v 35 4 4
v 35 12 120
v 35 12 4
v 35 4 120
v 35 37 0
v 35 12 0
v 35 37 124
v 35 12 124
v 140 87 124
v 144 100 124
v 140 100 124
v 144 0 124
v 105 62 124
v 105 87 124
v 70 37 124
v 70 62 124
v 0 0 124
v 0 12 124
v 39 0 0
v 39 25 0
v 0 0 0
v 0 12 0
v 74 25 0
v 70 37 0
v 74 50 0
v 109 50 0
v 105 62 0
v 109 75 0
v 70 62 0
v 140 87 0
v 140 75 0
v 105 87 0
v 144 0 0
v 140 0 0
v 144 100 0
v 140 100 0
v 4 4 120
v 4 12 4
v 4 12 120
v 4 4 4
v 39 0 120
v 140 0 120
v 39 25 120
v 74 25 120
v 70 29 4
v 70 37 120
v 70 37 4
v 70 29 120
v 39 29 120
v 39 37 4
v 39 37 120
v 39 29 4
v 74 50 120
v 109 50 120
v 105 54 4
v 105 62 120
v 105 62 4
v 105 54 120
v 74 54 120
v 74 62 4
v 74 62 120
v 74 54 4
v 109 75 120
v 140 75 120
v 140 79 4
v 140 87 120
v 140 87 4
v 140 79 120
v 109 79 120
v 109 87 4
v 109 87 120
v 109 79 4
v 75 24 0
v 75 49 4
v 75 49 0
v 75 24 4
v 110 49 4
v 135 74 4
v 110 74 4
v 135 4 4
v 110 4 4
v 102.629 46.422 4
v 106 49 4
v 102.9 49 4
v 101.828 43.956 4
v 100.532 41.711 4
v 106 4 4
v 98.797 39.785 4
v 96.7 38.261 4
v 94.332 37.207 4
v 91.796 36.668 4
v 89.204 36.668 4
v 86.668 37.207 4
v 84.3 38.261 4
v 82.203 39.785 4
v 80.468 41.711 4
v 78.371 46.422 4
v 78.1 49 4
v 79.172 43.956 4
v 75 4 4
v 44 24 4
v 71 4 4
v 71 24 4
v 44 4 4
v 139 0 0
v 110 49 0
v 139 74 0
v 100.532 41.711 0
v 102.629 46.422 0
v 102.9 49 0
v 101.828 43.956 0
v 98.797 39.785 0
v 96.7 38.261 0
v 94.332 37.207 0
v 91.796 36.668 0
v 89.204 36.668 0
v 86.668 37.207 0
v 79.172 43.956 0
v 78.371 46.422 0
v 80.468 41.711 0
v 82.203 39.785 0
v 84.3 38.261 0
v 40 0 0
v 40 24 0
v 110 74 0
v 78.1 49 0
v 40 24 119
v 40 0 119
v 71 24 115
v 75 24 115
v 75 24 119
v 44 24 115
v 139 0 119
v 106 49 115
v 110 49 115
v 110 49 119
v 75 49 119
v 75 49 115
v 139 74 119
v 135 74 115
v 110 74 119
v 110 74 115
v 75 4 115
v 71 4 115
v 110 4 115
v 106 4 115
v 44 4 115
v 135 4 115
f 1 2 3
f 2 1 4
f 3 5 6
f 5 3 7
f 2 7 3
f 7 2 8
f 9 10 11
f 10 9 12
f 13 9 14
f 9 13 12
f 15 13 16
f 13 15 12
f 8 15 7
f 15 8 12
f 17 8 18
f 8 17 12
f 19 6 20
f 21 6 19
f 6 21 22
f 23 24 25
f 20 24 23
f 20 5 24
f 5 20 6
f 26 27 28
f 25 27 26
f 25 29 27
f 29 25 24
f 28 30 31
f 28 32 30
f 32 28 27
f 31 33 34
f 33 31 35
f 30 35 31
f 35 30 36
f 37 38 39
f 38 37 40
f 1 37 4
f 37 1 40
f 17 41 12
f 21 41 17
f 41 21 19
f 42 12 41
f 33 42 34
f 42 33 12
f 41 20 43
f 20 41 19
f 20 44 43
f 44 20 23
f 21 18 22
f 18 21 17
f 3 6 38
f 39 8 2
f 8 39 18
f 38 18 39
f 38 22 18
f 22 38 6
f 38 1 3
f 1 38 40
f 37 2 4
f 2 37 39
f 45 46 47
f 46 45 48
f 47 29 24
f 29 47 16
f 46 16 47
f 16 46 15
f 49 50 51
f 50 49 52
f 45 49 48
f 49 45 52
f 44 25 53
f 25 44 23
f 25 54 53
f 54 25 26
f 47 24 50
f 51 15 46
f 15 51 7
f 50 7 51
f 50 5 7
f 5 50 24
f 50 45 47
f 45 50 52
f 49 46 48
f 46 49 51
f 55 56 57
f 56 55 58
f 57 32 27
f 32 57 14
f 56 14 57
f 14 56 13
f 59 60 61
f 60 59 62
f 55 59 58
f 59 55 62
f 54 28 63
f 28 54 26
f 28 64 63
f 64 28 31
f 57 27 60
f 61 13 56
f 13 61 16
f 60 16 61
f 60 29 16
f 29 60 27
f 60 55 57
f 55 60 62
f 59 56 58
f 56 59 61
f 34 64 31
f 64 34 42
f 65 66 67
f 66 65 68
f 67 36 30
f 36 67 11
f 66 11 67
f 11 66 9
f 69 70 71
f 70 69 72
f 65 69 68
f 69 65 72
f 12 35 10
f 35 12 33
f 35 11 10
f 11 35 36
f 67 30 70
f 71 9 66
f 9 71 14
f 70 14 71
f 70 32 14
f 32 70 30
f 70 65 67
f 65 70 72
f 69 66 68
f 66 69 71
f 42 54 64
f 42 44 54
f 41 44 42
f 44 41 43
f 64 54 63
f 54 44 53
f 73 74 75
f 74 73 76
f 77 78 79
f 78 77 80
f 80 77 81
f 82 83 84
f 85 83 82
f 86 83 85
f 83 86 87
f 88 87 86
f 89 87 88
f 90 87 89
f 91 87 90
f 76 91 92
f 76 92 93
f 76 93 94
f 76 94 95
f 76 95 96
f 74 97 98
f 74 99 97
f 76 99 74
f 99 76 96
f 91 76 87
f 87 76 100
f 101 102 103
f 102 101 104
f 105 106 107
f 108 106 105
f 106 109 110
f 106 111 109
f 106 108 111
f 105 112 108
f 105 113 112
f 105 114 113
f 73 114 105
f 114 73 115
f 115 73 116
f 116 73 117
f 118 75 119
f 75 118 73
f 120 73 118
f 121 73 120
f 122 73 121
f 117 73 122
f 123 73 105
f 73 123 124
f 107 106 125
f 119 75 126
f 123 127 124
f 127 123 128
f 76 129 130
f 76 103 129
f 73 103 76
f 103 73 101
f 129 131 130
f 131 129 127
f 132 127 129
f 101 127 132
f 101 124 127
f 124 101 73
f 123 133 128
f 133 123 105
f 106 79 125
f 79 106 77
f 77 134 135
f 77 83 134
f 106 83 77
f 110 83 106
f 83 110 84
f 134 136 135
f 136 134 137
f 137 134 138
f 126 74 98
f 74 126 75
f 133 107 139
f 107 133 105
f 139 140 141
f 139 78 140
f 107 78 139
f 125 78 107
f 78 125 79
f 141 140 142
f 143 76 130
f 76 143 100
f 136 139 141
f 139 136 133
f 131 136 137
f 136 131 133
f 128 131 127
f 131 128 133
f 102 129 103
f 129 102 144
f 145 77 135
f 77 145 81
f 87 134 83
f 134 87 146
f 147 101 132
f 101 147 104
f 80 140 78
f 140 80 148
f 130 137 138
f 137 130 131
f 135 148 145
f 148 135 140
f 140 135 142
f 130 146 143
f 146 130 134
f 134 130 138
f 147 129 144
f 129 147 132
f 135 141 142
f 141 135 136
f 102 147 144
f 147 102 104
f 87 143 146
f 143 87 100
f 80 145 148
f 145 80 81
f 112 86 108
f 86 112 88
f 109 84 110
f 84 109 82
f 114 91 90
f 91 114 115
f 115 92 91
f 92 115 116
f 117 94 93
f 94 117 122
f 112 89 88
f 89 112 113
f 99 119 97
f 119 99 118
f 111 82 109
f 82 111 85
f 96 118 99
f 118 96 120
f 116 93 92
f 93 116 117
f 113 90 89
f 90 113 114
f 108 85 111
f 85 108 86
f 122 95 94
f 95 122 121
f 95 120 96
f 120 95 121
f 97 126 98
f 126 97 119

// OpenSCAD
// file: fillets3d.scad
/*
Created by Kevin Gravier
https://www.thingiverse.com/mrkmg/about

My take on a top and bottom fillet for a 3d shape.

Available Modules:

topBottomFillet(b, t, r, s, e)
b = z of bottom of 3d object
t = z of top of 3d object
r = radius of fillet
s = steps of filler (smaller is smoother)
e = enabled (pass e = 0 to disable fillet for faster preview)

topFillet(t, r, s, e)
t = z of top of 3d object
r = radius of fillet
s = steps of filler (smaller is smoother)
e = enabled (pass e = 0 to disable fillet for faster preview)

bottomFillet(b, r, s, e)
b = z of bottom of 3d object
r = radius of fillet
s = steps of filler (smaller is smoother)
e = enabled (pass e = 0 to disable fillet for faster preview)

*/

enable = 1;

// Example, hard edges
translate([0, 20, 0])
topBottomFillet(b = 0, t = 10, r = 2, s = 20, e = enable)
linear_extrude(10, scale = 1.2)
difference() {
    union() {
        square([10, 10], true);
        translate([-15, 0]) circle(15);
    }
    translate([-15, 0]) circle(8);
    translate([-15, 0]) square([13, 13], center = true);
}

// Example, soft edges
use <fillets2d.scad>;
translate([0, -20, 0])
topBottomFillet(b = 0, t = 10, r = 1, s = 10, e = enable)
linear_extrude(10)
rounding2d(1)
fillet2d(1)
difference() {
    union() {
        square([10, 10], true);
        translate([-15, 0]) circle(15);
    }
    translate([-15, 0]) circle(8);
    translate([-15, 0]) square([13, 13], center = true);
}


// Example, text
translate([-60, 40])
rotate([0, 0, -90])
topBottomFillet(b = 0, t = 3, r = .5, s = 5, e = enable)
linear_extrude(3)
text("Fillets!", size = 20);


// Library

function filletDepth(r, d, i) = r * cos(asin(d * i / r));

module topBottomFillet(b = 0, t = 2, r = 1, s = 4, e = 1) {
    if (e == 1) {        
        topFilletPeice(t = t, r = r, s = s) children(0);
        bottomFilletPeice(b = b, r = r, s = s) children(0);
        
        render()
        difference() {
            children(0);
            
            translate([0, 0, t - r])
            linear_extrude(r + 1)
            offset(delta = 1e5)
            projection()
            children(0);
            
            translate([0, 0, b - 1])
            linear_extrude(r + 1)
            offset(delta = 1e5)
            projection()
            children(0);
            
        }
    }
    if (e == 0) children(0);
}

module topFillet(t = 2, r = 1, s = 4, e = 1) {
    if (e == 1) {
        topFilletPeice(t = t, r = r, s = s) children(0);
        
        render()
        difference() {
            children(0);
            translate([0, 0, t-r])
            linear_extrude(r + 1)
            offset(delta = 1e5)
            projection()
            children(0);
        }
    }
    if (e == 0) children(0);
}

module bottomFillet(b = 0, r = 1, s = 4, e = 1) {
    if (e == 1) {
        bottomFilletPeice(b = b, r = r, s = s) children(0);
        
        render()
        difference() {
            children(0);
            translate([0, 0, b - r - 1])
            linear_extrude(r + 1)
            offset(delta = 1e5)
            projection()
            children(0);
        }
    }
    if (e == 0) children(0);
}

module topFilletPeice(t = 2, r = 1, s = 4) {
    d = r/s;
        
    for (i = [0:s]) {
        x = filletDepth(r, d, i);
        z = d * (s - i + 1);                  
        translate([0, 0, t - z]) 
        linear_extrude(d) 
        offset(delta = -r + x) 
        projection(true) 
        translate([0, 0, -t + z])
        children(0);
    }
}

module bottomFilletPeice(b = 0, r =1, s = 4) {
    d = r/s;
        
    for (i = [0:s]) {
        x = filletDepth(r, d, i);
        z = d * (s - i);
        translate([0, 0, b + z]) 
        linear_extrude(d) 
        offset(delta = -r + x) 
        projection(true)
        translate([0, 0, b - z])
        children(0);
    }
}
// file: fillets2d.scad
/*
Modified by Kevin Gravier
https://www.thingiverse.com/mrkmg/about

Originally from: https://github.com/OskarLinde/scad-utils/blob/master/morphology.scad



Modules:

rounding2d(r)
r = radius of rounding

fillet2d(r)
r = radius of rounding

*/

$fa = 0.1;
$fs = 0.1;

// Example
linear_extrude(1)
rounding2d(1)
fillet2d(1)
difference() {
    union() {
        square([10, 10], center = true);
        translate([5, 5])
        square([10, 10], center = true);
    }
    
    translate([-5, -5])
    square([10, 10], center = true);
    
    translate([8, 8])
    circle(3);
}

// Example, text
translate([-20, -15])
rotate([0, 0, 0])
linear_extrude(1)
rounding2d(.25)
fillet2d(.25)
text("Fillets!");

module fillet2d(r) {
    offset(r = -r) offset(delta = r) children(0);
}

module rounding2d(r) {
    offset(r = r) offset(delta = -r) children(0);
}
// main file
use <fillets2d.scad>;
use <fillets3d.scad>;

length = 124;
stepWidth=31;
stepHeight=25;
thickness=4;
edgeHeight=8;

steps = 4;
game = 1;

slotGame =  0.4;
slotHoleWidth = 3;
slotHoleLength = 4;

slotPinHeight = 3;
slotHoleHeight = slotPinHeight + 0.5;

// Constraints: 
// stepWidth > 0
// Thickness > 2
// edgeHeight>=0
// stepHeight>=0
// steps >= 3?
// game >=0, <2
// PSLenght >=0
// slotGame >=0; <slotHoleWidth; <slotHoleLength
// slotHoleWidth  < Thickness         //should be fixed to the size...
// slotHoleHeight < Thickness
// slotHoleHeight < thickness + length
// slotPinHeight  < slotHoleHeight

// Derivated variables
slotPinLength = slotHoleLength - slotGame;
slotPinWidth  = slotHoleWidth - slotGame; 
holeRadius = 0.4*stepWidth;
upFront = thickness + edgeHeight;

module oneStep(x,y,z){
translate(x,y,z){  
cube([thickness, upFront, length]);
translate([thickness, 0, 0]){
    cube([stepWidth, thickness, length]);
    translate([stepWidth, 0, 0]){
        cube([thickness, stepHeight, length]);        
    }
}
}
}

module oneSide(x,y,z){
translate(x,y,z){  
cube([2*thickness+stepWidth, upFront, thickness]);
}
}


module drawerSide(){
        

        // Series of standard ones
        for(i = [1:steps-2]){
        translate([i*(thickness + stepWidth)+thickness+game, 0, 0]){
            cube([stepWidth + thickness, i*stepHeight-game, thickness]);
        }
        }

        // last drawer side piece
        translate([(steps-1)*(thickness + stepWidth)+thickness+game, 0, 0]){
            cube([stepWidth -2*game, (steps-1)*stepHeight-game, thickness]);
        }
    }

module drawerWalls(){
    // front drawer wall
    translate([stepWidth + 2*thickness + game, 0, 0]){
            cube([thickness, stepHeight-game, length - thickness - game]);
        }

    // Separators
    for(i = [1:steps-1]){
        translate([i*(stepWidth+thickness) +game, 0, 0]){
        cube([thickness, (i-1)*stepHeight-game, length - thickness - game]);
    }
    }
    // last drawer wall
        translate([steps*(stepWidth+thickness) - game - thickness, 0, 0]){
        cube([thickness, (steps-1)*stepHeight-game, length - thickness - game]);
    }
    }

module drawerBottom(){
    
    translate([stepWidth + 2*thickness + game, 0, 0]){
            cube([(steps-1)*(stepWidth+thickness) - 2*thickness, thickness, length - thickness - game]);
        }
    }

module makeStandMiddle(){
        for(i = [0:steps-1]){
        translate(i*[stepWidth+thickness, stepHeight, 0]){
            oneStep([0,0,0]);
            oneSide([0,0,0]);
            translate([0,0,length - thickness]) oneSide([0,0,0]);
        }
        }
    } 

module makeStandMiddleOnly(){
        for(i = [0:steps-1]){
        translate(i*[stepWidth+thickness, stepHeight, 0]){
            oneStep([0,0,0]);
        }
        }
    } 
module makeStandBoarder(){
    for(i = [0:steps-1]){
        translate([i*(stepWidth+thickness), i*stepHeight, 0]){
            oneSide([0,0,0]);
        }
    }
}

module makeBackSupport(){
    translate(steps*[stepWidth+thickness, 0, 0]){
        cube([thickness, stepHeight*steps-1, length]);
    }
    }
    

module makeStandBoarderRight(){
     for(i = [0:steps-1]){       
        translate([i*(stepWidth+thickness), 0*stepHeight, length-thickness]){
                //oneSide([0,0,0]);
            
                cube([2*thickness+stepWidth, i*stepHeight, thickness]);
            }

        
    }
    
}

module makeHole(){
    sth = ceil(steps/2);
    toMoveX = sth*(stepWidth+thickness)+thickness + game + 1/2*stepWidth;
    toMoveY = (sth)*(stepHeight) - game;
    
    translate([toMoveX,toMoveY, 0]){cylinder(h=thickness*2, r1=holeRadius, r2 = holeRadius, center=true);}
    
}

module addpins(slotPinWidth_in, slotPinLength_in, slotPinHeight_in){
    for(i = [0:steps-1]){
    translate([i*(thickness + stepWidth) + thickness + stepWidth/2,i*stepHeight + thickness/2,0]){
        translate([-slotPinLength_in/2,-slotPinWidth_in/2,0]){
        cube([slotPinLength_in, slotPinWidth_in, slotPinHeight_in]);}
        }
    
    
    translate([steps*(thickness + stepWidth) + thickness/2,(i)*stepHeight + stepHeight/2, 0]){
            translate([-slotPinWidth_in/2,-slotPinLength_in/2,0]){
                cube([slotPinWidth_in, slotPinLength_in, slotPinHeight_in]);
               }
          }  
        }
}

module normalPS(){
union(){

// stand
makeStandMiddle();
        
// Right boarder
makeStandBoarderRight();

// Back support
makeBackSupport();
    

    
}
// Drawer
difference(){
union(){
drawerSide();
drawerWalls();
drawerBottom();
translate([0,0,length-2*thickness-game]){drawerSide();}
}
makeHole();
}
}

module ExtensiblePS_Left(){
    union(){
// stand
makeStandMiddleOnly();
        
// Right boarder
makeStandBoarder();
// Back support
makeBackSupport();
// add pins
translate([0,0,length]){
    topFillet(slotPinHeight, 1, stepsPerFillet, enableFillets) addpins(slotPinWidth - slotGame, slotPinLength- slotGame, slotPinHeight);    
}
}
}

module ExtensiblePS_Right(){
    difference(){
    union(){
        // stand
        makeStandMiddleOnly();

        // Left boarder            
        translate([0,0,length - thickness]) makeStandBoarder();
        
        // Back support
        makeBackSupport();   
       
        // Right boarder
        makeStandBoarderRight();   
    }

     // Add pin from the other side
    addpins(slotPinWidth, slotPinLength, slotPinHeight);
    }
}
   
// Make Standard
normalPS();


// Make expandable Left
//ExtensiblePS_Left();

// Make expandable Right
//ExtensiblePS_Right();

// Make expandable Center


            




        
